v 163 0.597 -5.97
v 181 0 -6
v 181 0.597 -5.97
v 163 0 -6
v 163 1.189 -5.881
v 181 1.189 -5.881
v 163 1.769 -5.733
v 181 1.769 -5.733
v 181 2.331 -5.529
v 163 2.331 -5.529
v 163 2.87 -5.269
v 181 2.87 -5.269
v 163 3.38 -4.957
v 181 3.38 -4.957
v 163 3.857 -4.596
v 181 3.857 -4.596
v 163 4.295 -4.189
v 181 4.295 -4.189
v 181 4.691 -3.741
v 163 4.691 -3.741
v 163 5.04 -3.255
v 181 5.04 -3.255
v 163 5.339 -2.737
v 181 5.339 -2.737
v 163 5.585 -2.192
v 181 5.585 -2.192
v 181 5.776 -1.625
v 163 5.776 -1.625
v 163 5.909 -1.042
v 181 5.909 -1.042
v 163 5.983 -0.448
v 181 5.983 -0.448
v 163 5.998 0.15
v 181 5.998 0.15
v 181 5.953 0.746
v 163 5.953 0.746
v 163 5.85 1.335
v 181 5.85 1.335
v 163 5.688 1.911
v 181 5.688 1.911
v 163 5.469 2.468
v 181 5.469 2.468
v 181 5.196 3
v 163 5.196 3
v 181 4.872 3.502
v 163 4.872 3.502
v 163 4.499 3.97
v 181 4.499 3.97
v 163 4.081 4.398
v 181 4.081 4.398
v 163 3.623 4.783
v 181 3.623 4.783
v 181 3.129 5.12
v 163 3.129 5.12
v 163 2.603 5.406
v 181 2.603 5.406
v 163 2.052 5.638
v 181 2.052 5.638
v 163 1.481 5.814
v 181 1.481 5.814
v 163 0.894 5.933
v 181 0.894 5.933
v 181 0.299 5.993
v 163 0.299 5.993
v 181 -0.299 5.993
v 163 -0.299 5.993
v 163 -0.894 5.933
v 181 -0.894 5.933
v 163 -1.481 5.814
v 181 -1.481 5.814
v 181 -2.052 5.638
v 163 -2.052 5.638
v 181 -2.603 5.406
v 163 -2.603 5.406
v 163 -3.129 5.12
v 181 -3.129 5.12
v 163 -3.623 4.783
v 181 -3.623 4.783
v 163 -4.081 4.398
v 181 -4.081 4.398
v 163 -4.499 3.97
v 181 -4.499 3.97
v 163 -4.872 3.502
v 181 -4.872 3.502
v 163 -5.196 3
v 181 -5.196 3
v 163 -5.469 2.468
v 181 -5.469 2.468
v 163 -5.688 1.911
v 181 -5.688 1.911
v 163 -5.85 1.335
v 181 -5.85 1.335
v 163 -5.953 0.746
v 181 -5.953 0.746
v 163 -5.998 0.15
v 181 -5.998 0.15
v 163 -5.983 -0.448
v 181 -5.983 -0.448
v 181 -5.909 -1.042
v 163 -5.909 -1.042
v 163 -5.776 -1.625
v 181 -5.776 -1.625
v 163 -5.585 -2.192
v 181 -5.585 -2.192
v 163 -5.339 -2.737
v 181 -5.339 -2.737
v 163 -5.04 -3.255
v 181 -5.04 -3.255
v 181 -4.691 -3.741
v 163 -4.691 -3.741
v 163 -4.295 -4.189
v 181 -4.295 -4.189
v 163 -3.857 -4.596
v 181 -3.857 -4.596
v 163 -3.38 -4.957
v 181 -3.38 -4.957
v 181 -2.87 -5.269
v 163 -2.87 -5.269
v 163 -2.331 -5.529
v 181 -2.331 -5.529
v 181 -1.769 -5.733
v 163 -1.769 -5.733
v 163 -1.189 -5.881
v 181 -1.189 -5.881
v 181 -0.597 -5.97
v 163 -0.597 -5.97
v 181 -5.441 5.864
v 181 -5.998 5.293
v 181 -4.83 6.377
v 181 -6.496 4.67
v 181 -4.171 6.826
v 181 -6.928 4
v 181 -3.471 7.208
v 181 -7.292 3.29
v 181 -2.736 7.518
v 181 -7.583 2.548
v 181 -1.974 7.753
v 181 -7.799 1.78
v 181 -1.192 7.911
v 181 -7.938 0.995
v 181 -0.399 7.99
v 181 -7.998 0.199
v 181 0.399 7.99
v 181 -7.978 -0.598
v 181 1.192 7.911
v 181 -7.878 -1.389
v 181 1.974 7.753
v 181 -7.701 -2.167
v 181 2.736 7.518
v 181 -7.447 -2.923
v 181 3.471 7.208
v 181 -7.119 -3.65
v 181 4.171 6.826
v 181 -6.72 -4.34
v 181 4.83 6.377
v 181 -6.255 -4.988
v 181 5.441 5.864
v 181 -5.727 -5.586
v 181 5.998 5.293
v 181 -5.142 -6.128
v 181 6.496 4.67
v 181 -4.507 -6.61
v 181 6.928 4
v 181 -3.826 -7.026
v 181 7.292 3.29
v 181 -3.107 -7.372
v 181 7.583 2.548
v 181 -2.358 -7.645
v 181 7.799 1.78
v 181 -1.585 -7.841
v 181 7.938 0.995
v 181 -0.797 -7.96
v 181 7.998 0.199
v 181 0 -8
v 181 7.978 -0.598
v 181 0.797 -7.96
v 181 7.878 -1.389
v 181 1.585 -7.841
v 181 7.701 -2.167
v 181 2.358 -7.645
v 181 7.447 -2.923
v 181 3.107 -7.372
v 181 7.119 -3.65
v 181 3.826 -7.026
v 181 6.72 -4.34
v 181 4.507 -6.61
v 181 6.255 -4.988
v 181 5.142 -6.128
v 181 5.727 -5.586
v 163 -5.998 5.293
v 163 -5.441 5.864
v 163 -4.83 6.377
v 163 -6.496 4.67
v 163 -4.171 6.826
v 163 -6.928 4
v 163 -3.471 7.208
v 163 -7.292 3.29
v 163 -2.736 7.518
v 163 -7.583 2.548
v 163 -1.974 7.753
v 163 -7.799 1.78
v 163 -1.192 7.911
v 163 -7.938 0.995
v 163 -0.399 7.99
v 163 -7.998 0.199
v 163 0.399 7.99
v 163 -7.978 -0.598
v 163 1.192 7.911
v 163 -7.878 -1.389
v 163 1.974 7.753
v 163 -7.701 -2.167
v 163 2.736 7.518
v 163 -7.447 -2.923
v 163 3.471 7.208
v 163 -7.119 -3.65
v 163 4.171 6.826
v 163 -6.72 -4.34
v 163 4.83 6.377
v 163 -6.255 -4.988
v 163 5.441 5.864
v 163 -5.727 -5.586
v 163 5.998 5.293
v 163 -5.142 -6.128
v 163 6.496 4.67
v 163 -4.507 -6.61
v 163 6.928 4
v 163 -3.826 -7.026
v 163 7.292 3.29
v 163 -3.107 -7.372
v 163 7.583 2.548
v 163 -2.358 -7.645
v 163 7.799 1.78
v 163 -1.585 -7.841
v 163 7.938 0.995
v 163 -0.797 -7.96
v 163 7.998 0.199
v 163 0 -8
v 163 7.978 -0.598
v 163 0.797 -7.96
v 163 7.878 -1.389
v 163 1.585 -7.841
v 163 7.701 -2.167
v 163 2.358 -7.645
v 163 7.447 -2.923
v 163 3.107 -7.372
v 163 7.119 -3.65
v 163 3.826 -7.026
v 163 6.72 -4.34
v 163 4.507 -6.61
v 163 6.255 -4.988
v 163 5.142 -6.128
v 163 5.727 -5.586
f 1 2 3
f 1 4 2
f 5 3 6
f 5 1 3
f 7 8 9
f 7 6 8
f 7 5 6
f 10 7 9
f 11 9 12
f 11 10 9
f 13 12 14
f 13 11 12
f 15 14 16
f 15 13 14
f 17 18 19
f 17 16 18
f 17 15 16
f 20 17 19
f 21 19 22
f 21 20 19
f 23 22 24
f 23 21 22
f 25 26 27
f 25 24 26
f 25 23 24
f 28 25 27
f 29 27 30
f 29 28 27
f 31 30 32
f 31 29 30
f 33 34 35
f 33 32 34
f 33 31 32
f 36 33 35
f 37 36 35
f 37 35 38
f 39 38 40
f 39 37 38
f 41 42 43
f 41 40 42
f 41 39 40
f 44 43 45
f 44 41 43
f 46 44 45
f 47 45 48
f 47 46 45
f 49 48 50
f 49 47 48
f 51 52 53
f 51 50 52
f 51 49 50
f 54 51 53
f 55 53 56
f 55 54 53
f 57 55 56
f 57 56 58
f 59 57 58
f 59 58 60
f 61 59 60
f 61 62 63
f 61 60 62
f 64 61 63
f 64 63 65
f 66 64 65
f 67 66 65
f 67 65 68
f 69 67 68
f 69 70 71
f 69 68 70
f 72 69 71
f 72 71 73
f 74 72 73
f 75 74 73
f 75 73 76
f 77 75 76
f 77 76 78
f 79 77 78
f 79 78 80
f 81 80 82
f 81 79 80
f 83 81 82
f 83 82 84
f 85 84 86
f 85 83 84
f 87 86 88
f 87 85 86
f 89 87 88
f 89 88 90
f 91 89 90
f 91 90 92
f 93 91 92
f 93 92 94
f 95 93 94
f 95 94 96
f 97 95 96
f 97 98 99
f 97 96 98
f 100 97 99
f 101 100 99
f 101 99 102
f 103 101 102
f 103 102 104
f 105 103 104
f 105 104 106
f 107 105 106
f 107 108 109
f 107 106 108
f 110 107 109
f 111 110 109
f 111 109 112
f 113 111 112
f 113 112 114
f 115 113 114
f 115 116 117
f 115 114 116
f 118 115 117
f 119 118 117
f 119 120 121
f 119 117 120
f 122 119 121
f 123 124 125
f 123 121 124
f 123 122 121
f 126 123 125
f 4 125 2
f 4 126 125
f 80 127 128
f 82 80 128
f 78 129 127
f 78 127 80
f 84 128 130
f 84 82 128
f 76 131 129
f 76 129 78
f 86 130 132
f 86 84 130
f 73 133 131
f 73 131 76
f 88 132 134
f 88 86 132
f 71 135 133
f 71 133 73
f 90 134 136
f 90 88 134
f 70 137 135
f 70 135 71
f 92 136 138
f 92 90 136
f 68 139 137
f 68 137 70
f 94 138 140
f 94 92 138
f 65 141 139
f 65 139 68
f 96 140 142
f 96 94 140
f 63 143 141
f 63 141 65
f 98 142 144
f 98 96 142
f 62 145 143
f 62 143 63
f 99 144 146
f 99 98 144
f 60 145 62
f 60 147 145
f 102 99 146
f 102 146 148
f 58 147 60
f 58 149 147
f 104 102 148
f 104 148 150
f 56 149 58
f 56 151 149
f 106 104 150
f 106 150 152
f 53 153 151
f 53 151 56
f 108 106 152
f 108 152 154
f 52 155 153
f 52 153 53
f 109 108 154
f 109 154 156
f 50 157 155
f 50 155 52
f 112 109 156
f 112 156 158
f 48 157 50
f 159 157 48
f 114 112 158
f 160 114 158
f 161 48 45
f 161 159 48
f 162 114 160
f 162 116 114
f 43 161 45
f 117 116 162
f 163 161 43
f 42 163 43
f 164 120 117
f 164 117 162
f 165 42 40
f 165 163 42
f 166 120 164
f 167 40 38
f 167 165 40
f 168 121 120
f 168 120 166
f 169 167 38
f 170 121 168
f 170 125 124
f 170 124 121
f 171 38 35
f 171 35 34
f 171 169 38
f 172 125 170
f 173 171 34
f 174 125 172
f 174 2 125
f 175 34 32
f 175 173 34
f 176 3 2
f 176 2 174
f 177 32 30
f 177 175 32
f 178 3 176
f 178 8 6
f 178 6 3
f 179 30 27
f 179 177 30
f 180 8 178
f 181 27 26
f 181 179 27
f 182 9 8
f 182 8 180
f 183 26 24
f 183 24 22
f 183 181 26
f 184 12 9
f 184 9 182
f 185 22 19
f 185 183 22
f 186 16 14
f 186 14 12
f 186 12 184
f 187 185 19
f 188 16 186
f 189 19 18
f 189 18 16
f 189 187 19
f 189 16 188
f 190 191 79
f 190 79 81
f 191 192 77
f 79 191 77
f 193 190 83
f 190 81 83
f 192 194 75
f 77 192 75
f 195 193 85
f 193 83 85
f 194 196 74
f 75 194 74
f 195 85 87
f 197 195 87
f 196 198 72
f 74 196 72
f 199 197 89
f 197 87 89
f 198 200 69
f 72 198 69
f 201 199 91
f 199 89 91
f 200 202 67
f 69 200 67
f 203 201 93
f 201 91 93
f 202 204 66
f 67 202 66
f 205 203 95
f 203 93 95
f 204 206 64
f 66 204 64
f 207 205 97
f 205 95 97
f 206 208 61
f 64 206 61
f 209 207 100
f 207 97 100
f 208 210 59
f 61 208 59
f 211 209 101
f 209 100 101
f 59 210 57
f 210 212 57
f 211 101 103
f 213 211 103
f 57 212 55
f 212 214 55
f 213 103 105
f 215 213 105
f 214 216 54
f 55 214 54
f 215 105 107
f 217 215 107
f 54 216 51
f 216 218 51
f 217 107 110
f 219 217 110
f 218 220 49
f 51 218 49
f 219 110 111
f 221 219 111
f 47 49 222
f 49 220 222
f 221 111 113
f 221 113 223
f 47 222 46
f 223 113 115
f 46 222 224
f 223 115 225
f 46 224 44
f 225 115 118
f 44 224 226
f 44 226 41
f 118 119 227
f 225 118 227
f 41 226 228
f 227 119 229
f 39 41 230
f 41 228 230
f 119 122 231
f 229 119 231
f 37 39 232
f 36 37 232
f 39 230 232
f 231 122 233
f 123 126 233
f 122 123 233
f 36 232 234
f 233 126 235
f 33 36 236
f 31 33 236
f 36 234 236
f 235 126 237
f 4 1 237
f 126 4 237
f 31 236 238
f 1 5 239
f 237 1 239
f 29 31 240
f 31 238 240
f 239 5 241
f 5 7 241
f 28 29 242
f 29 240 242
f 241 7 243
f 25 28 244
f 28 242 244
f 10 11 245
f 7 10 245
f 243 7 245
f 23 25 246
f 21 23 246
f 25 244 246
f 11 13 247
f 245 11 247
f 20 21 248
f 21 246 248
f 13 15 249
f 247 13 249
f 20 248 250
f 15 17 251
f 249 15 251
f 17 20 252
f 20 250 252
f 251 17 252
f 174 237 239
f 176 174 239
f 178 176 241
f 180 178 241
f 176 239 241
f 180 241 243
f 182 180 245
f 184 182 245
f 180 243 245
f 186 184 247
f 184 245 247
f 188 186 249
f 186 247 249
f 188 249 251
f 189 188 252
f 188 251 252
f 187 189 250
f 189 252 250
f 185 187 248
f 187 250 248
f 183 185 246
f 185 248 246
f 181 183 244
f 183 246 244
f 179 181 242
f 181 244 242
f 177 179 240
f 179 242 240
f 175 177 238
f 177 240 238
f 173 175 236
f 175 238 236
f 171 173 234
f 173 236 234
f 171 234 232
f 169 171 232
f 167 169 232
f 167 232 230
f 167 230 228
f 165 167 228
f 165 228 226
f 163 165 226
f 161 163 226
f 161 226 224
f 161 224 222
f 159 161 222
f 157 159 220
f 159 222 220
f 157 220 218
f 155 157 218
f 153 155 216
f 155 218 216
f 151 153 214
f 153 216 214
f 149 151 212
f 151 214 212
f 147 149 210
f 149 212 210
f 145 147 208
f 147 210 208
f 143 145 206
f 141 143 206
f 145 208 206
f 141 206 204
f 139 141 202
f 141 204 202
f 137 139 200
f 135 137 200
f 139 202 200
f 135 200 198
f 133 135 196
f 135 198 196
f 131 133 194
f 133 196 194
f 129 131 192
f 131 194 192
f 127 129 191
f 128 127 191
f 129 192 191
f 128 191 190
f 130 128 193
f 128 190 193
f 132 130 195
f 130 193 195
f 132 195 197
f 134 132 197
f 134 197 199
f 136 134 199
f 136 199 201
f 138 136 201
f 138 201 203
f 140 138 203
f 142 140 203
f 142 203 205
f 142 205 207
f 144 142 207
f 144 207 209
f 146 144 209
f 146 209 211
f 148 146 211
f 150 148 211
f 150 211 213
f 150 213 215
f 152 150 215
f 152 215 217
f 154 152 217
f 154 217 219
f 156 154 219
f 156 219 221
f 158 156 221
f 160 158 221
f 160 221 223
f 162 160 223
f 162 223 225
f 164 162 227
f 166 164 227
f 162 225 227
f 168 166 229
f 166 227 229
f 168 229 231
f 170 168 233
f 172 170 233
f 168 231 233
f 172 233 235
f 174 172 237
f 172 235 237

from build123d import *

# Parameters (mm, degrees)
CYLINDER007_R           = 6
CYLINDER007_DEPTH       = 236
CYLINDER007_PITCH_ANGLE = 90
CYLINDER005_R           = 8
CYLINDER005_DEPTH       = 18
CYLINDER005_PITCH_ANGLE = 90


with BuildPart() as connector_bore:
    # Cylinder007 → Cylinder007 (new body)
    with BuildSketch(Plane.XY):
        Circle(CYLINDER007_R)
    extrude(amount=CYLINDER007_DEPTH)


with BuildPart() as connector_bore_1:
    # Cylinder007 pitch: moved
    add(connector_bore.part.rotate(Axis((0, 0, 0), (0, 1, 0)), CYLINDER007_PITCH_ANGLE))


with BuildPart() as connector_bore_2:
    # Cylinder007 placement: moved
    add(connector_bore_1.part.moved(Location((-45, 0, 0))))


with BuildPart() as cut003:
    # Cylinder005 → Cylinder005 (new body)
    with BuildSketch(Plane.XY):
        Circle(CYLINDER005_R)
    extrude(amount=CYLINDER005_DEPTH)


with BuildPart() as cut003_1:
    # Cylinder005 pitch: moved
    add(cut003.part.rotate(Axis((0, 0, 0), (0, 1, 0)), CYLINDER005_PITCH_ANGLE))


with BuildPart() as cut003_2:
    # Cylinder005 placement: moved
    add(cut003_1.part.moved(Location((163, 0, 0))))

    # Cut003: cut connector_bore
    add(connector_bore_2.part, mode=Mode.SUBTRACT)


solid = cut003_2.part
